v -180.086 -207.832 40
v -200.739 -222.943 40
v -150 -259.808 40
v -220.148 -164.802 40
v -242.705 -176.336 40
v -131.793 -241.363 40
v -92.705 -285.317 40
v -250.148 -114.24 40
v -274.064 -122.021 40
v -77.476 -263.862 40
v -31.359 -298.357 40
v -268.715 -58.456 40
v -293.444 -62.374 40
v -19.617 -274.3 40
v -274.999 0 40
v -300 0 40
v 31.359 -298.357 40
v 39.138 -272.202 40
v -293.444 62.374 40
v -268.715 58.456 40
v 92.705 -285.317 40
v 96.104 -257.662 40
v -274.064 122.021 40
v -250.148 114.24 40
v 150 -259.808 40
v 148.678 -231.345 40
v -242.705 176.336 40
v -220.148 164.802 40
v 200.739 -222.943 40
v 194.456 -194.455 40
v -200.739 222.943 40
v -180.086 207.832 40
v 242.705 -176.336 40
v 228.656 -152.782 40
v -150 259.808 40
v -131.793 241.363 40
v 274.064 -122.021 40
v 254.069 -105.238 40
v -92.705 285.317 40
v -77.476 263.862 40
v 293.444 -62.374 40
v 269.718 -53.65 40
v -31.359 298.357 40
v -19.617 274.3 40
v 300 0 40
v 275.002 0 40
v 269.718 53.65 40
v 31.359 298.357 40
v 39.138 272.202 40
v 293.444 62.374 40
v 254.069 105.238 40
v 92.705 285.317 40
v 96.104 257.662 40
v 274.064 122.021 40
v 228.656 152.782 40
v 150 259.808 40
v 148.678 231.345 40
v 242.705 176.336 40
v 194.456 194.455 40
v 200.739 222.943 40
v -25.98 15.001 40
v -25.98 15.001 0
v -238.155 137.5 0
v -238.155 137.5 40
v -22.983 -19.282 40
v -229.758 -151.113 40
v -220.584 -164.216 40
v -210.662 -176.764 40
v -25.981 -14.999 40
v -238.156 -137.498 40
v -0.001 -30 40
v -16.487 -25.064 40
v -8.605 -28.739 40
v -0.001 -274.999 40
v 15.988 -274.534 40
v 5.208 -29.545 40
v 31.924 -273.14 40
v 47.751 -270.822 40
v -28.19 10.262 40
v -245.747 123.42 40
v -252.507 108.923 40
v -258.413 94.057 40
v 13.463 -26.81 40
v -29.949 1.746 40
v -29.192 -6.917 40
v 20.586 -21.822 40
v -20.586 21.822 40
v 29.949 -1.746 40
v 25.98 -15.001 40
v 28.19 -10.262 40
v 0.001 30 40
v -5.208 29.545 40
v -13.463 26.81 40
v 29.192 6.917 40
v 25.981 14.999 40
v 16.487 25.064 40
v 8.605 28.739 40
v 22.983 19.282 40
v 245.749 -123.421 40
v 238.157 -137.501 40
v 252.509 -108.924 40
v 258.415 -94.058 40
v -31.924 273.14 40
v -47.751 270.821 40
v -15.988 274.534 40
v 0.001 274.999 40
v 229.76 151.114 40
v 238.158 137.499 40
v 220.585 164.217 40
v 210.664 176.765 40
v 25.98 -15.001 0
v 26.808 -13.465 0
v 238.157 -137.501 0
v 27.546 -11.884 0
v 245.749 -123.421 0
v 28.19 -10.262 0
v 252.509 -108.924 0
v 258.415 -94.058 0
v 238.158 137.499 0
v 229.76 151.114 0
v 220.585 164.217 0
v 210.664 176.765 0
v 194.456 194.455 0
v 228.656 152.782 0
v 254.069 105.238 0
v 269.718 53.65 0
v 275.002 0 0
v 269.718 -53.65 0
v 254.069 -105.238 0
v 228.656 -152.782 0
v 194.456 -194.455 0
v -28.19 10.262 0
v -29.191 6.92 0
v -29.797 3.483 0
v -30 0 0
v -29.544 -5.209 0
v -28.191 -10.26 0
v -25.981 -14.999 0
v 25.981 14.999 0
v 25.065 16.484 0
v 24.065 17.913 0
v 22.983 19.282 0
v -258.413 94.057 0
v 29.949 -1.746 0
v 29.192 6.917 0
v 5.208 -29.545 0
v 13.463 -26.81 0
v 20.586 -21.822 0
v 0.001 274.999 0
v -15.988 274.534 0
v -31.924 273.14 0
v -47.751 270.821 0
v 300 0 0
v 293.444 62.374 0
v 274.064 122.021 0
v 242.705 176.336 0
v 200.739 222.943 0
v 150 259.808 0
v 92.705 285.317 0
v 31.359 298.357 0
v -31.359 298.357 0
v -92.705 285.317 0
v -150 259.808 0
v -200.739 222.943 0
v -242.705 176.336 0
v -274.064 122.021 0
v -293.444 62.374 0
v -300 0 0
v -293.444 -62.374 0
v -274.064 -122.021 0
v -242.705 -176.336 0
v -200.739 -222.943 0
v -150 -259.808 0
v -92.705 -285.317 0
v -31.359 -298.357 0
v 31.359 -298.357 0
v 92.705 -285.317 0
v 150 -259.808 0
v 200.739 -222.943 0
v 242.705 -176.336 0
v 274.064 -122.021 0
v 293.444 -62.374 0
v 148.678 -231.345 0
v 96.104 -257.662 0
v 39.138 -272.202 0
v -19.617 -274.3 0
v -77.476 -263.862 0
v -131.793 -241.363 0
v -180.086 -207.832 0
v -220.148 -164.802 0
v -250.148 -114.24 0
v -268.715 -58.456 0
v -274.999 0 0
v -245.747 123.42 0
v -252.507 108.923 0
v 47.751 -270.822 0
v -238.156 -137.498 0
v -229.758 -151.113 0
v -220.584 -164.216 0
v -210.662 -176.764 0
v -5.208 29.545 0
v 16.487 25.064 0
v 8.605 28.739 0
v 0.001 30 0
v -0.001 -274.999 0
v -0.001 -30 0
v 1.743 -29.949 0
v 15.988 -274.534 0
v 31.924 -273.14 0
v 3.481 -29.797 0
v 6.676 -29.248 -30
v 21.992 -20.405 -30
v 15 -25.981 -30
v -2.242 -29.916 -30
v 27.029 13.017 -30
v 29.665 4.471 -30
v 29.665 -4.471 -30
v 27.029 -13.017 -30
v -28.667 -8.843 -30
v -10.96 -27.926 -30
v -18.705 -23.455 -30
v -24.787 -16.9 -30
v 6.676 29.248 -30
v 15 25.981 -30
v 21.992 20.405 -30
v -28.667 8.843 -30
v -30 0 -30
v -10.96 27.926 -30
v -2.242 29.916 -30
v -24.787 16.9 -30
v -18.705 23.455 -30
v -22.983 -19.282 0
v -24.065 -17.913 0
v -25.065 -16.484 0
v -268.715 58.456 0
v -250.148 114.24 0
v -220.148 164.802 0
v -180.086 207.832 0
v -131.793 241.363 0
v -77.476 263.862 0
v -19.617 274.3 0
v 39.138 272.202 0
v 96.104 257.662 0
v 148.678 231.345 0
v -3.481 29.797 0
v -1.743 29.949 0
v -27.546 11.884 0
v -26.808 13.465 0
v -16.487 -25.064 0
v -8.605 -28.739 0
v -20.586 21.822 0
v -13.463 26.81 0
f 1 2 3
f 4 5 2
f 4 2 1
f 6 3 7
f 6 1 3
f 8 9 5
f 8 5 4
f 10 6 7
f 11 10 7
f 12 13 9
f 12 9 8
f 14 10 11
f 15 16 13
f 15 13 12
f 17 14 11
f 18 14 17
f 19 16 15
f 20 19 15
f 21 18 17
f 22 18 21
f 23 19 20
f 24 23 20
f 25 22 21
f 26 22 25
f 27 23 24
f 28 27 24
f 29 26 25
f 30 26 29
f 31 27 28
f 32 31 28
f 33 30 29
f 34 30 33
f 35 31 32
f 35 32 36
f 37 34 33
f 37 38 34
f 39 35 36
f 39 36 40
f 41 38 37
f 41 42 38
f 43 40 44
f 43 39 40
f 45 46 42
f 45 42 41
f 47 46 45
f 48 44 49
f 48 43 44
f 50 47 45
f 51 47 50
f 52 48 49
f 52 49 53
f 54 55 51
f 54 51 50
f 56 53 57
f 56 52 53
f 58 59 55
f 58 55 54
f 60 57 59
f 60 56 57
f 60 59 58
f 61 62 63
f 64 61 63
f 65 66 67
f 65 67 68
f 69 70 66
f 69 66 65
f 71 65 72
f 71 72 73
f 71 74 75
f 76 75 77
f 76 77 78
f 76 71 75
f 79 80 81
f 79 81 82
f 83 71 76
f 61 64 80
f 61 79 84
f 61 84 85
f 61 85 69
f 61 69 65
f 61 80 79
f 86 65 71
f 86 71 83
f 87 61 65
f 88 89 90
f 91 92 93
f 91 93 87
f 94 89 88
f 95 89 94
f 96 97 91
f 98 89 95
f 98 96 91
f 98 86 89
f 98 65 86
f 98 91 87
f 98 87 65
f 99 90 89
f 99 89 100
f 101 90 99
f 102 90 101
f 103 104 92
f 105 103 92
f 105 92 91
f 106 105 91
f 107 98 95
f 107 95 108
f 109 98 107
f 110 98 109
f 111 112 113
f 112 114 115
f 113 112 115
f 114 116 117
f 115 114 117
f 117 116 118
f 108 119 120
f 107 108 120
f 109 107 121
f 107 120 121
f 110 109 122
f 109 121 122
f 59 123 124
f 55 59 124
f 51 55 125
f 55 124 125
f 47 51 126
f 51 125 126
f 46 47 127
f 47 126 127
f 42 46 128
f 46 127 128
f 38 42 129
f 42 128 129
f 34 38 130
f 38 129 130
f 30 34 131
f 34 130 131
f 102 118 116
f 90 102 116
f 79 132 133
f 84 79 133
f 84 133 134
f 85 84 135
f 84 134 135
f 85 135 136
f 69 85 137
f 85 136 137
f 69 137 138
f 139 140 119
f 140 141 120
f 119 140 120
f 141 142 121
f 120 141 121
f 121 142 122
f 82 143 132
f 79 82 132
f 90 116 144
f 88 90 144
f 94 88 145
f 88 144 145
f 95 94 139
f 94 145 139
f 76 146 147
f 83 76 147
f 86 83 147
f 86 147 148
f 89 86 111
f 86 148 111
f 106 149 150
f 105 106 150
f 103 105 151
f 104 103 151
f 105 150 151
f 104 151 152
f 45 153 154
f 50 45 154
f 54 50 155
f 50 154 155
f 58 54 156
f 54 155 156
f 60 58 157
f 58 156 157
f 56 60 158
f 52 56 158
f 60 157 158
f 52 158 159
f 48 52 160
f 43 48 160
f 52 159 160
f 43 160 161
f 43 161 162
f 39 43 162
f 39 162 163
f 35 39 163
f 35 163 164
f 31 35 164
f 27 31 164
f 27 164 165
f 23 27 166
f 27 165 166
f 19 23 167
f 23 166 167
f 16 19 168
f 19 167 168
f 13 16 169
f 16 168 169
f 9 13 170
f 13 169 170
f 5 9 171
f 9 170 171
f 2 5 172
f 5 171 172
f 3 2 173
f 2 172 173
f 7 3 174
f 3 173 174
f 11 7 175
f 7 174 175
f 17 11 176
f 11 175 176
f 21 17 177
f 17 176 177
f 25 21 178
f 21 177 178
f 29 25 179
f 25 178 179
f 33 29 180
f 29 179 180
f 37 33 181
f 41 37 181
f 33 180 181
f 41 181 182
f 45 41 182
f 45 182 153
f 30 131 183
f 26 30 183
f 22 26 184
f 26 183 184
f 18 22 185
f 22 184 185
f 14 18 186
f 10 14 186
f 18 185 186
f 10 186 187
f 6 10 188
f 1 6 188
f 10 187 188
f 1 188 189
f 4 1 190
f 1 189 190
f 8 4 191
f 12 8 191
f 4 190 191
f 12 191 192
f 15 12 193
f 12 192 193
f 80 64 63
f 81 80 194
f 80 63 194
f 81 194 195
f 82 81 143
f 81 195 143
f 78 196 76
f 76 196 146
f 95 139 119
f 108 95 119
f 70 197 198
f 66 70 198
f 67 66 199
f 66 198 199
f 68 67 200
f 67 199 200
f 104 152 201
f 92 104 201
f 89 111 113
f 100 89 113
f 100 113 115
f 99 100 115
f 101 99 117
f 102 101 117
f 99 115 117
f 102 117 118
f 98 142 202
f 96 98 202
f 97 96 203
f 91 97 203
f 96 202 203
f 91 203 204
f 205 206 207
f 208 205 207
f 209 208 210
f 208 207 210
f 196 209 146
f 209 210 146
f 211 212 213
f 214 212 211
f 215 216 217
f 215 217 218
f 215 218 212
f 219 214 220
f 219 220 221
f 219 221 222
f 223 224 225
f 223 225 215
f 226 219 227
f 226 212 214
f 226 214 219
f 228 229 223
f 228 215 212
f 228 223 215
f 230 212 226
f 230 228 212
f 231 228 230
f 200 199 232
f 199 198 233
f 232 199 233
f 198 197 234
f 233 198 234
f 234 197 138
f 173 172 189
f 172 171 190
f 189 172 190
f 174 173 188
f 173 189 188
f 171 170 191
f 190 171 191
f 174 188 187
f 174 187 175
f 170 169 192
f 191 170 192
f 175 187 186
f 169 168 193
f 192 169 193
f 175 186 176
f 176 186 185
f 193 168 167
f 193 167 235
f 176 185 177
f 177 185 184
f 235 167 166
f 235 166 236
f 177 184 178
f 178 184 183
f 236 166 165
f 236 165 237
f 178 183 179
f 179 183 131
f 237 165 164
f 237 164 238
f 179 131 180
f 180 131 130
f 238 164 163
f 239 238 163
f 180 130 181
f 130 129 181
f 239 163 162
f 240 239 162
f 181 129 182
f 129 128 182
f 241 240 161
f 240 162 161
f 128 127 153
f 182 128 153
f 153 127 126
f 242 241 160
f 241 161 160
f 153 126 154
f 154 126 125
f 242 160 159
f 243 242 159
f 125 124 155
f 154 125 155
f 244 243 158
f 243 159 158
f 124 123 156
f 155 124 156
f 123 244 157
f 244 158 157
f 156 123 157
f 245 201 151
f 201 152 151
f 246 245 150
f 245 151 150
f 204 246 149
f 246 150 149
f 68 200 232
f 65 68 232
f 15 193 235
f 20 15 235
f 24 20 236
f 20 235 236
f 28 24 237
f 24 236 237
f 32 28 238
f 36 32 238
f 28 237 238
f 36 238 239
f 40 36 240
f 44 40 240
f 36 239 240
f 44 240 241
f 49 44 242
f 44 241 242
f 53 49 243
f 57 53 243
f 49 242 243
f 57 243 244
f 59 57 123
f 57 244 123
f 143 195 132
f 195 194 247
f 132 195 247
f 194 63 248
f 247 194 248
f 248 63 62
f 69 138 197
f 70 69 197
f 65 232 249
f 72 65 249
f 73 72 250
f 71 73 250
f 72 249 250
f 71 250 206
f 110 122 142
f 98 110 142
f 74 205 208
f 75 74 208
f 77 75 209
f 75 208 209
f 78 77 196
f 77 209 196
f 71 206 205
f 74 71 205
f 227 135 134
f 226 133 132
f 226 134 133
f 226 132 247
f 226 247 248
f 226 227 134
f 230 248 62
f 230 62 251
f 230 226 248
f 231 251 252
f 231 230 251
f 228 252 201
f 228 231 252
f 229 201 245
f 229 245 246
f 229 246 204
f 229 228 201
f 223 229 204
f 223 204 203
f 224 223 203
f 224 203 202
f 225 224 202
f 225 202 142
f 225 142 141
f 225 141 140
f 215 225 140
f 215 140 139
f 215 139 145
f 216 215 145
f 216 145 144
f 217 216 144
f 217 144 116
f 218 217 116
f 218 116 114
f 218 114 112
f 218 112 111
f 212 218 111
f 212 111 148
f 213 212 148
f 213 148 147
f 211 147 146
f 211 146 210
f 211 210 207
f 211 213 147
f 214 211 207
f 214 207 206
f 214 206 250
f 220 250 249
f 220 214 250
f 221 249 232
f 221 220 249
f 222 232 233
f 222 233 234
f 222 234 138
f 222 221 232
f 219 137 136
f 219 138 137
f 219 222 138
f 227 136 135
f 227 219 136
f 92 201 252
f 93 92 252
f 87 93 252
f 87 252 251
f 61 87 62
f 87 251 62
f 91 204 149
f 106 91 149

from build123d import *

# Parameters (mm, degrees)
EXTRUDE_8_OUTLINE_R = 300
EXTRUDE_8_DEPTH     = 40
EXTRUDE_START       = 30
SKETCH_2_R          = 30
EXTRUDE_9_DEPTH     = 30


# Read off the part's stored shape, not the designer's step: 凸台-拉伸8
with BuildPart() as part:
    # 凸台-拉伸8 outline → 凸台-拉伸8 (new body)
    # profile 1 of 2: a face of its own
    with BuildSketch(Plane.XY):
        Circle(EXTRUDE_8_OUTLINE_R)
        with BuildLine():
            ThreePointArc((194.455864826, 194.454864826), (275.002, 0), (194.455864826, -194.454864826))
            ThreePointArc((194.455864826, -194.454864826), (-105.237079199, -254.067815398), (-274.998999998, 0))
            ThreePointArc((-274.998999998, 0), (-105.237079199, 254.067815398), (194.455864826, 194.454864826))
        make_face(mode=Mode.SUBTRACT)
    # profile 2 of 2: a face of its own
    with BuildSketch(Plane.XY):
        with BuildLine():
            Line((0.001, 29.999999983), (0.001, 274.999))
            ThreePointArc((0.001, 274.999), (-23.966252232, 273.952592458), (-47.751108002, 270.82133324))
            Line((-47.751108002, 270.82133324), (-5.207505626, 29.544574547))
            ThreePointArc((-5.207505626, 29.544574547), (-17.206076786, 24.575412949), (-25.980262099, 15.000866017))
            Line((-25.980262099, 15.000866017), (-238.154986041, 137.5))
            ThreePointArc((-238.154986041, 137.5), (-249.232369781, 116.220604542), (-258.413031021, 94.056747459))
            Line((-258.413031021, 94.056747459), (-28.190104915, 10.262455111))
            ThreePointArc((-28.190104915, 10.262455111), (-29.885970316, -2.613193121), (-25.981262099, -14.999133966))
            Line((-25.981262099, -14.999133966), (-238.155986034, -137.498267946))
            ThreePointArc((-238.155986034, -137.498267946), (-225.266319296, -157.73136759), (-210.662314239, -176.764099031))
            Line((-210.662314239, -176.764099031), (-22.982599288, -19.282119436))
            ThreePointArc((-22.982599288, -19.282119436), (-12.679893529, -27.188606071), (-0.001, -29.999999983))
            Line((-0.001, -29.999999983), (-0.001, -274.998999993))
            ThreePointArc((-0.001, -274.998999993), (23.966274976, -273.952765434), (47.751168306, -270.821675245))
            Line((47.751168306, -270.821675245), (5.207505626, -29.544574547))
            ThreePointArc((5.207505626, -29.544574547), (17.206076786, -24.575412949), (25.980262099, -15.000866017))
            Line((25.980262099, -15.000866017), (238.156803019, -137.501049033))
            ThreePointArc((238.156803019, -137.501049033), (249.234454424, -116.221567498), (258.415358678, -94.057594657))
            Line((258.415358678, -94.057594657), (28.190104915, -10.262455111))
            ThreePointArc((28.190104915, -10.262455111), (29.885970316, 2.613193121), (25.981262099, 14.999133966))
            Line((25.981262099, 14.999133966), (238.157803028, 137.499316987))
            ThreePointArc((238.157803028, 137.499316987), (225.267868034, 157.732440228), (210.663582322, 176.765163078))
            Line((210.663582322, 176.765163078), (22.982599288, 19.282119436))
            ThreePointArc((22.982599288, 19.282119436), (12.679893529, 27.188606071), (0.001, 29.999999983))
        make_face()
    extrude(amount=EXTRUDE_8_DEPTH)

    # 草图2 → 凸台-拉伸9 (add)
    with BuildSketch(Plane(origin=(0, 0, 0), x_dir=(-1, 0, 0), z_dir=(0, 0, -1)).offset(EXTRUDE_START)):
        Circle(SKETCH_2_R)
    extrude(amount=-EXTRUDE_9_DEPTH)


solid = part.part
